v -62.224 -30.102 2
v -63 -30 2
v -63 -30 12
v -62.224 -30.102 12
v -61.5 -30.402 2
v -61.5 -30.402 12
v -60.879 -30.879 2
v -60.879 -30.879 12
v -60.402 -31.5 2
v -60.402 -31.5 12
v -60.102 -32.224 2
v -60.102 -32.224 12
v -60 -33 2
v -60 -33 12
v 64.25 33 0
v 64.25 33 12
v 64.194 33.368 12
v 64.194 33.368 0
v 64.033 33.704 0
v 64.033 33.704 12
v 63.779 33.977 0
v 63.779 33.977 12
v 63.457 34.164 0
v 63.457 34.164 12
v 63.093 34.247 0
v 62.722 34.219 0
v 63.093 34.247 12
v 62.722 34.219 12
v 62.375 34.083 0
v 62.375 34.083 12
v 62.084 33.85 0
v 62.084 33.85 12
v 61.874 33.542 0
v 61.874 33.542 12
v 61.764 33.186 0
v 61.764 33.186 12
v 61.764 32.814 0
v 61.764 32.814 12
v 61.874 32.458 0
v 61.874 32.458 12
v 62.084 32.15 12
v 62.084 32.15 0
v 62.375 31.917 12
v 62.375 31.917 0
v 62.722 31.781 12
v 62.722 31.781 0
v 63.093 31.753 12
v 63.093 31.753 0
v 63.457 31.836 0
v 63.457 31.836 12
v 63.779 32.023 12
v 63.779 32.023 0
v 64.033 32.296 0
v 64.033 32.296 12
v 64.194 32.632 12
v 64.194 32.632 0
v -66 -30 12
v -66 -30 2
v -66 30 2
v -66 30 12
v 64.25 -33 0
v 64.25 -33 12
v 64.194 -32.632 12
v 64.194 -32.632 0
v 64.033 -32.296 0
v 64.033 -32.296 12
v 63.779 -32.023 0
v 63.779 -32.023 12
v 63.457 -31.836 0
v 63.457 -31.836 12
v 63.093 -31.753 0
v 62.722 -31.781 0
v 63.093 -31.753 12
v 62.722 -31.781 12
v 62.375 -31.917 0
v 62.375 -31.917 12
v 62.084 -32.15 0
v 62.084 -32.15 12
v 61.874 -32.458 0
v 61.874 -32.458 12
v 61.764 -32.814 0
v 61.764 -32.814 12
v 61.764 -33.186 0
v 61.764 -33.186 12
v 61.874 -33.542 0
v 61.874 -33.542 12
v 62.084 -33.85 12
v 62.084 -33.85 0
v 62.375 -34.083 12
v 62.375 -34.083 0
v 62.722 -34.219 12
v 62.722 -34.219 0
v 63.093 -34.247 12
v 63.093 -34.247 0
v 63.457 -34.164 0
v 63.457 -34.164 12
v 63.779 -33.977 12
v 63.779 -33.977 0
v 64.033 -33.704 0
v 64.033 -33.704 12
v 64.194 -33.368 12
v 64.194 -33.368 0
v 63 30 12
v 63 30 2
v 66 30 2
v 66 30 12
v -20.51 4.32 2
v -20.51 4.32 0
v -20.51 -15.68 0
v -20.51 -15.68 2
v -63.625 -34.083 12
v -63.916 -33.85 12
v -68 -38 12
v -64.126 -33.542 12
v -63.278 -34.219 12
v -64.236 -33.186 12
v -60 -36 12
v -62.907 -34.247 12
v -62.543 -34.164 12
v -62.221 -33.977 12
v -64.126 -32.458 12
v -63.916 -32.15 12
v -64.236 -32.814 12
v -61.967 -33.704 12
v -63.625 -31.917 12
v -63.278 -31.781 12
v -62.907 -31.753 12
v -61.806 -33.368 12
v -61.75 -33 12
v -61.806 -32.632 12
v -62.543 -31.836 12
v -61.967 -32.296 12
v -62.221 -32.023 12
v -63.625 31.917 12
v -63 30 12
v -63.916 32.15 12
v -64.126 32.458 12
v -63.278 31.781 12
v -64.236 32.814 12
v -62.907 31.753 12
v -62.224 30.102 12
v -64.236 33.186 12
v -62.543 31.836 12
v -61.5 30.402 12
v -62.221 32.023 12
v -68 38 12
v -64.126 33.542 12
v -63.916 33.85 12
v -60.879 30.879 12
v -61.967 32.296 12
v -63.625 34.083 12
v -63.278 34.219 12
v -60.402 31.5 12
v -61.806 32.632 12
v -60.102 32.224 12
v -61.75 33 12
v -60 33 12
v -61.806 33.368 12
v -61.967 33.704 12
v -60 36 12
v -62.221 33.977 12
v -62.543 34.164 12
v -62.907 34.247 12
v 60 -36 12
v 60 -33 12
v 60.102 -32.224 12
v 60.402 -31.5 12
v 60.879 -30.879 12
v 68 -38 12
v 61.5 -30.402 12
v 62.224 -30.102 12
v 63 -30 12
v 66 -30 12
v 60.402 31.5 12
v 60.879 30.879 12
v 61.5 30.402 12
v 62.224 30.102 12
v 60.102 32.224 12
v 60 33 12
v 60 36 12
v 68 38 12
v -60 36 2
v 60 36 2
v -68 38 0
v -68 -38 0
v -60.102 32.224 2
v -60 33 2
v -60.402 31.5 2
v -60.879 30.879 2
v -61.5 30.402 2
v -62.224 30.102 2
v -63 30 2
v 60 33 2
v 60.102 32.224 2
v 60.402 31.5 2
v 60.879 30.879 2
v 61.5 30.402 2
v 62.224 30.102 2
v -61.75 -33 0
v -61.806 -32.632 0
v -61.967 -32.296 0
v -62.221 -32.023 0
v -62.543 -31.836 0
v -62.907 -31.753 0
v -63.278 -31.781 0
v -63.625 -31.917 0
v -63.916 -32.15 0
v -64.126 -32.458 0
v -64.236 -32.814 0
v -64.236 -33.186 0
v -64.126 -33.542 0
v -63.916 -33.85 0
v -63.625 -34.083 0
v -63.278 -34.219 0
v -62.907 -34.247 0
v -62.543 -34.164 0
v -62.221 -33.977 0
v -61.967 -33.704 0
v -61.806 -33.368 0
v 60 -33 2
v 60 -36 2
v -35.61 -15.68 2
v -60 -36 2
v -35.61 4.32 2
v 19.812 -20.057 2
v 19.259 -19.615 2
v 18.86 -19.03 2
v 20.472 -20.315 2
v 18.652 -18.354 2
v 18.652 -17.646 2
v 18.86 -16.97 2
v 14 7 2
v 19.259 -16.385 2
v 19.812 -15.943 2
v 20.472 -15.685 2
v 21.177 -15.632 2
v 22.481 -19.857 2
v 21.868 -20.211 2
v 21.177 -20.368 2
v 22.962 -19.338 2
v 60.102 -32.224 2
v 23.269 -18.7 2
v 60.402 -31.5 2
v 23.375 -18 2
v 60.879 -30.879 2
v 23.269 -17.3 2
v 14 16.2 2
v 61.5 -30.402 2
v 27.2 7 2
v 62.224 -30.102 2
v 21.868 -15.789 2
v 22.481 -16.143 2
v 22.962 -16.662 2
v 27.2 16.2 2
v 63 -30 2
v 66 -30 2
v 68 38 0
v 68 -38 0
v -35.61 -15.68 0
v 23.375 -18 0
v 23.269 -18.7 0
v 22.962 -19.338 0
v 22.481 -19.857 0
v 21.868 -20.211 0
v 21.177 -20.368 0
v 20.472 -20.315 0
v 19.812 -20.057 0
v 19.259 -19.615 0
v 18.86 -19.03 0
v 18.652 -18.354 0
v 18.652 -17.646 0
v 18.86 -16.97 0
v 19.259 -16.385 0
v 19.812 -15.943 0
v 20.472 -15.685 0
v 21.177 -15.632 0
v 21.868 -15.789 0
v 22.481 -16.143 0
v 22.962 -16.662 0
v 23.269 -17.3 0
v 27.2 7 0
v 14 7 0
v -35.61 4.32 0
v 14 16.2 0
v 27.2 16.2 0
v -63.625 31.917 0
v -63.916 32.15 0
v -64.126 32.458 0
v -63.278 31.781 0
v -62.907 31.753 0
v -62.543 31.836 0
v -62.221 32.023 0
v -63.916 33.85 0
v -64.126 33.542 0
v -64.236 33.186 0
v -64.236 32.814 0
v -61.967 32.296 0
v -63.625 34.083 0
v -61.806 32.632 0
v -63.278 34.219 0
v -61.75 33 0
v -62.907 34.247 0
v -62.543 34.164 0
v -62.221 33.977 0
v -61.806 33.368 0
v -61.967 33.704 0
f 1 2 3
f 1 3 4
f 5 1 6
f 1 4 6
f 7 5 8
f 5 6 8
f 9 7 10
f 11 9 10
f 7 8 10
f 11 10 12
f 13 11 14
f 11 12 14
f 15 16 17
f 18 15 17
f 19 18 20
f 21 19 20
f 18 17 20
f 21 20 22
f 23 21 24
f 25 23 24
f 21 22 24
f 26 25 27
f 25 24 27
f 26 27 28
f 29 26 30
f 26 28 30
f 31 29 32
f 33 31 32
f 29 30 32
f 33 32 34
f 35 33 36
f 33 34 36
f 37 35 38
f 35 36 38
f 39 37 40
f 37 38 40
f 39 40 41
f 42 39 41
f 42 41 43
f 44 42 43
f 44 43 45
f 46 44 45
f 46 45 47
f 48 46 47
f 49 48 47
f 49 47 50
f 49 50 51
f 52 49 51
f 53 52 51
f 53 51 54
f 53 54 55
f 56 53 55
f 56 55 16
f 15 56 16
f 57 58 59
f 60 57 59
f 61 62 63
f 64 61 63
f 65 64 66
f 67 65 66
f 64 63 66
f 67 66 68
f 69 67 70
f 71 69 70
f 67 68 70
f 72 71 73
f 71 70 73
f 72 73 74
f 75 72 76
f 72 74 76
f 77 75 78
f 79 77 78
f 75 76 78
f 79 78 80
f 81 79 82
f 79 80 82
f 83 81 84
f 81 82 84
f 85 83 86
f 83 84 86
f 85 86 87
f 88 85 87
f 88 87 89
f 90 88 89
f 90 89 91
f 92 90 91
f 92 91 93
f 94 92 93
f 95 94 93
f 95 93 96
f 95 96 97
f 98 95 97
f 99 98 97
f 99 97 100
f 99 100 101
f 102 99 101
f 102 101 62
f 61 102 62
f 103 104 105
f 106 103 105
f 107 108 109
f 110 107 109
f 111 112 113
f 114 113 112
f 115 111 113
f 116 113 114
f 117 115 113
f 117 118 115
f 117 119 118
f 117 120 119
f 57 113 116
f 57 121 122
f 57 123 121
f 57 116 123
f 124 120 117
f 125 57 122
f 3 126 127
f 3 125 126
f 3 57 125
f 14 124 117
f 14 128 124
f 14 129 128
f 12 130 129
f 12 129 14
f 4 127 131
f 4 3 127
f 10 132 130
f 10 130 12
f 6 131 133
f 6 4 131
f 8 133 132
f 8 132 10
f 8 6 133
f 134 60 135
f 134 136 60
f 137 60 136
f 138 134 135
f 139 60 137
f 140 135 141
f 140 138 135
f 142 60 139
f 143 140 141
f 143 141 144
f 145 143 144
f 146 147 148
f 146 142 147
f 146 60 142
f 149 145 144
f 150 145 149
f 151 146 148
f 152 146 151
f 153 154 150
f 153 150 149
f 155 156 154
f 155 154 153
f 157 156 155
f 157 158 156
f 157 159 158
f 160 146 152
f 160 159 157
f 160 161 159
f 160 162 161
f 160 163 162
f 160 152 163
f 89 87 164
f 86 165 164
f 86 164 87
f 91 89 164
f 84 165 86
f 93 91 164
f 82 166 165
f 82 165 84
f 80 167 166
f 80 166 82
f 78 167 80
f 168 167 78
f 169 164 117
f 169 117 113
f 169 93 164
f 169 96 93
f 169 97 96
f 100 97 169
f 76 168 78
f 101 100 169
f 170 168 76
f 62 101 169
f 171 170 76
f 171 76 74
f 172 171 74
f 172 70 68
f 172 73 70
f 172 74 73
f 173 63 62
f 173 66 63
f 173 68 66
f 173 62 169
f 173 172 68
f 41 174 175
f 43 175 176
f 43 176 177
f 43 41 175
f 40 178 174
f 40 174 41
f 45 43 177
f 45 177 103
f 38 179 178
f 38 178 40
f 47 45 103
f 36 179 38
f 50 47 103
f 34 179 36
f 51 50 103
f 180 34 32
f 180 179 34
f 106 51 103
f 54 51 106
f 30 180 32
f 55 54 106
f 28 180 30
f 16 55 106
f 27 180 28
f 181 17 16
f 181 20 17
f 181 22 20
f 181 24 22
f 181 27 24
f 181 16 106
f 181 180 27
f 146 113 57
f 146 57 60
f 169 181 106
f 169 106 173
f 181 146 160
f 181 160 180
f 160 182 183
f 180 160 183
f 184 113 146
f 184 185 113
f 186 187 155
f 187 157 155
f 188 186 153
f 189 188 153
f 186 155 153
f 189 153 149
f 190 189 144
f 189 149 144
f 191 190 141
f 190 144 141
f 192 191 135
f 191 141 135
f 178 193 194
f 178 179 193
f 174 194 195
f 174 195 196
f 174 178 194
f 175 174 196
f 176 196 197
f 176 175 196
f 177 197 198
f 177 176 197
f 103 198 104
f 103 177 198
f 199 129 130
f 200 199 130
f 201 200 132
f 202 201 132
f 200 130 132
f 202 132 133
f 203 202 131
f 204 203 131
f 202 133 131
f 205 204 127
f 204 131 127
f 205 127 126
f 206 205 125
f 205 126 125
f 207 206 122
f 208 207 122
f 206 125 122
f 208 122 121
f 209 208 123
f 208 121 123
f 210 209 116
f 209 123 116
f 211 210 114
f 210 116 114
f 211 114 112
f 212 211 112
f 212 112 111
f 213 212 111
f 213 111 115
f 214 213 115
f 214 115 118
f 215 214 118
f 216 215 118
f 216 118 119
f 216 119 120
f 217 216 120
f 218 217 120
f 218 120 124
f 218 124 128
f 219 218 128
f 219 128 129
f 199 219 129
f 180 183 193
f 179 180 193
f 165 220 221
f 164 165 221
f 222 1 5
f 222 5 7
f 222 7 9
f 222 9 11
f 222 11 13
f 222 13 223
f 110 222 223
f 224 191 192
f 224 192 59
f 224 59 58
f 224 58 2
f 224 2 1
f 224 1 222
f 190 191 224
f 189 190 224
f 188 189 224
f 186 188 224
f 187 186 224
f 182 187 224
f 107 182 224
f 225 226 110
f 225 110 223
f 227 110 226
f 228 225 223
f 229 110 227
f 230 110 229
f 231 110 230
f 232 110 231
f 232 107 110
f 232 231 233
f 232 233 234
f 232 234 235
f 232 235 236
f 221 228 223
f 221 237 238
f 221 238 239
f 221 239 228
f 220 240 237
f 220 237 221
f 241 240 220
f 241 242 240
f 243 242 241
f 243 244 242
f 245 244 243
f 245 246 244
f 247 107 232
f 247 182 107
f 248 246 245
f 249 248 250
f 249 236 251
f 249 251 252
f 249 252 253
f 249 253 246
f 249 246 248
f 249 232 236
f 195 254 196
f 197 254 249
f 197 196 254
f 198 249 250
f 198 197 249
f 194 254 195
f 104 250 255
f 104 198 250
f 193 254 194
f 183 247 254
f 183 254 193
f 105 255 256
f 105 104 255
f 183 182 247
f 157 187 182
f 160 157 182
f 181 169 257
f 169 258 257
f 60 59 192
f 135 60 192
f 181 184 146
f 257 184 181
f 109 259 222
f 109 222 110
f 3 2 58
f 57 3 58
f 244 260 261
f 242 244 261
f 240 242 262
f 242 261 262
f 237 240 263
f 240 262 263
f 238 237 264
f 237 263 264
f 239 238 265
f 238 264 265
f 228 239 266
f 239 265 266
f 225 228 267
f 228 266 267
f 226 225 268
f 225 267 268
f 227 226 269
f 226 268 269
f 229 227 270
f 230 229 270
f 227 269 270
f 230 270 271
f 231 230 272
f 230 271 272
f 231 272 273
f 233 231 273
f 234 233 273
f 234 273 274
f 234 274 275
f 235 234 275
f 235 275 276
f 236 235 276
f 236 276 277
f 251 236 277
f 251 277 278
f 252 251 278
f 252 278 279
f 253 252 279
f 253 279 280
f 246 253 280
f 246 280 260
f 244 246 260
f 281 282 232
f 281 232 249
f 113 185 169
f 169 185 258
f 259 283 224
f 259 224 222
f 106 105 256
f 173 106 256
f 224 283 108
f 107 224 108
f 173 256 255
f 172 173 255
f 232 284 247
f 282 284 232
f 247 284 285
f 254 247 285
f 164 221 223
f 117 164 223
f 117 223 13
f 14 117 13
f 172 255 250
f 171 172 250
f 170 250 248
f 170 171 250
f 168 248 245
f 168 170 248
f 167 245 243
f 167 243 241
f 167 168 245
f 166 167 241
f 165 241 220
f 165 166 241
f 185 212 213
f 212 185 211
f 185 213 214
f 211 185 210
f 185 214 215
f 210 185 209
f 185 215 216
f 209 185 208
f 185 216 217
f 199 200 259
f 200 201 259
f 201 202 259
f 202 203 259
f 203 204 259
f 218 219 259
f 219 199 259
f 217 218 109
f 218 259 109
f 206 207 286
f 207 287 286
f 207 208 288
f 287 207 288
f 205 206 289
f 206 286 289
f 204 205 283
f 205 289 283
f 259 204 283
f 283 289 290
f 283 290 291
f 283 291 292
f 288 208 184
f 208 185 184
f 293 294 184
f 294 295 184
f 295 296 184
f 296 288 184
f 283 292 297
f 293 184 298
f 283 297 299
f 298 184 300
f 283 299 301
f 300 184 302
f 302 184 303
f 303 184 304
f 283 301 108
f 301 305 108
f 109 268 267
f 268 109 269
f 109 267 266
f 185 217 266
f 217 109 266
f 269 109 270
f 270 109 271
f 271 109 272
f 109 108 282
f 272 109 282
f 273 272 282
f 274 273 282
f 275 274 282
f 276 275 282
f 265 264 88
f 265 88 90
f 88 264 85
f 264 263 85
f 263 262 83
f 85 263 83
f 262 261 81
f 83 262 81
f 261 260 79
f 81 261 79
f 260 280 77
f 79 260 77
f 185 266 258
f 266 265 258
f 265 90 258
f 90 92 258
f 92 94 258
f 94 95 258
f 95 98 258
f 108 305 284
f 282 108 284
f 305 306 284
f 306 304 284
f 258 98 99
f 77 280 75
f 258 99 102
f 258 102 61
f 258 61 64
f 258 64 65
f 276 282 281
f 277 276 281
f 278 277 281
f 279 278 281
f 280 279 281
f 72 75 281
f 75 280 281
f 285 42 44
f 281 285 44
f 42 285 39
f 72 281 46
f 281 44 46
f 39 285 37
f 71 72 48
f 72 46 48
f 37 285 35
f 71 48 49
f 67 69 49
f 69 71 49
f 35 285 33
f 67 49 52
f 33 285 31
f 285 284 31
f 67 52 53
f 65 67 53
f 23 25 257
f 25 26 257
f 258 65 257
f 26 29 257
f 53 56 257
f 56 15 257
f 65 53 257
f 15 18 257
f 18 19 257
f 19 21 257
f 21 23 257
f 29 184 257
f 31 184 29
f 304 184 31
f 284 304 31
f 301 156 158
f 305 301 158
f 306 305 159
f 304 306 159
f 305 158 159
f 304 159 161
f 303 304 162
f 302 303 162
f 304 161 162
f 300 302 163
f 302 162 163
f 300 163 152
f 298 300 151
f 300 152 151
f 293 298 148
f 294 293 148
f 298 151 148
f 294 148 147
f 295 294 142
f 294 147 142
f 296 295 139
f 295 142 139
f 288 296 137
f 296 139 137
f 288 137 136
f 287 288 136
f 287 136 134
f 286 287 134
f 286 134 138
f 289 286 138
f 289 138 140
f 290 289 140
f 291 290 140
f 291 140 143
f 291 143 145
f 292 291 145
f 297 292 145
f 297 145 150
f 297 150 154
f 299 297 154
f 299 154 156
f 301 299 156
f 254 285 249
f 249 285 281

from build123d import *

# Parameters (mm, degrees)
SKETCH_W        = 136
SKETCH_H        = 76
PAD_DEPTH       = 2
SKETCH001_W     = 136
SKETCH001_H     = 76
PAD001_DEPTH    = 10
SKETCH002_R     = 1.25
POCKET_DEPTH    = 13
SKETCH003_R     = 2.375
SKETCH003_W     = 15.1
SKETCH003_H     = 20
SKETCH003_W_2   = 13.2
SKETCH003_H_2   = 9.2
POCKET001_DEPTH = 3
FILLET_R        = 3


with BuildPart() as part:
    # Sketch → Pad (new body)
    with BuildSketch(Plane.XY):
        Rectangle(SKETCH_W, SKETCH_H)
    extrude(amount=PAD_DEPTH)

    # Sketch001 (on Face6 of Pad) → Pad001 (join)
    with BuildSketch(Plane.XY.offset(2)):
        Rectangle(SKETCH001_W, SKETCH001_H)
        Polygon((-60, 36), (60, 36), (60, 30), (66, 30), (66, -30), (60, -30), (60, -36), (-60, -36), (-60, -30), (-66, -30), (-66, 30), (-60, 30), align=None, mode=Mode.SUBTRACT)
    extrude(amount=PAD001_DEPTH)

    # Sketch002 (on Face9 of Pad001) → Pocket (cut)
    with BuildSketch(Plane.XY.offset(12)):
        with Locations((-63, 33)):
            Circle(SKETCH002_R)
        with Locations((-63, -33)):
            Circle(SKETCH002_R)
        with Locations((63, 33)):
            Circle(SKETCH002_R)
        with Locations((63, -33)):
            Circle(SKETCH002_R)
    extrude(amount=-POCKET_DEPTH, mode=Mode.SUBTRACT)

    # Sketch003 (on Face4 of Pocket) → Pocket001 (cut)
    with BuildSketch(Plane(origin=(0, 0, 0), x_dir=(1, 0, 0), z_dir=(0, 0, -1))):
        with Locations((21, 18)):
            Circle(SKETCH003_R)
        with Locations((-28.06, 5.68)):
            Rectangle(SKETCH003_W, SKETCH003_H)
        with Locations((20.6, -11.6)):
            Rectangle(SKETCH003_W_2, SKETCH003_H_2)
    extrude(amount=-POCKET001_DEPTH, mode=Mode.SUBTRACT)

    # Fillet
    fillet_edges = [part.edges().sort_by_distance(p)[0] for p in [
        (60, 30, 7),
        (-60, 30, 7),
        (60, -30, 7),
        (-60, -30, 7),
    ]]
    fillet(fillet_edges, radius=FILLET_R)


solid = part.part
